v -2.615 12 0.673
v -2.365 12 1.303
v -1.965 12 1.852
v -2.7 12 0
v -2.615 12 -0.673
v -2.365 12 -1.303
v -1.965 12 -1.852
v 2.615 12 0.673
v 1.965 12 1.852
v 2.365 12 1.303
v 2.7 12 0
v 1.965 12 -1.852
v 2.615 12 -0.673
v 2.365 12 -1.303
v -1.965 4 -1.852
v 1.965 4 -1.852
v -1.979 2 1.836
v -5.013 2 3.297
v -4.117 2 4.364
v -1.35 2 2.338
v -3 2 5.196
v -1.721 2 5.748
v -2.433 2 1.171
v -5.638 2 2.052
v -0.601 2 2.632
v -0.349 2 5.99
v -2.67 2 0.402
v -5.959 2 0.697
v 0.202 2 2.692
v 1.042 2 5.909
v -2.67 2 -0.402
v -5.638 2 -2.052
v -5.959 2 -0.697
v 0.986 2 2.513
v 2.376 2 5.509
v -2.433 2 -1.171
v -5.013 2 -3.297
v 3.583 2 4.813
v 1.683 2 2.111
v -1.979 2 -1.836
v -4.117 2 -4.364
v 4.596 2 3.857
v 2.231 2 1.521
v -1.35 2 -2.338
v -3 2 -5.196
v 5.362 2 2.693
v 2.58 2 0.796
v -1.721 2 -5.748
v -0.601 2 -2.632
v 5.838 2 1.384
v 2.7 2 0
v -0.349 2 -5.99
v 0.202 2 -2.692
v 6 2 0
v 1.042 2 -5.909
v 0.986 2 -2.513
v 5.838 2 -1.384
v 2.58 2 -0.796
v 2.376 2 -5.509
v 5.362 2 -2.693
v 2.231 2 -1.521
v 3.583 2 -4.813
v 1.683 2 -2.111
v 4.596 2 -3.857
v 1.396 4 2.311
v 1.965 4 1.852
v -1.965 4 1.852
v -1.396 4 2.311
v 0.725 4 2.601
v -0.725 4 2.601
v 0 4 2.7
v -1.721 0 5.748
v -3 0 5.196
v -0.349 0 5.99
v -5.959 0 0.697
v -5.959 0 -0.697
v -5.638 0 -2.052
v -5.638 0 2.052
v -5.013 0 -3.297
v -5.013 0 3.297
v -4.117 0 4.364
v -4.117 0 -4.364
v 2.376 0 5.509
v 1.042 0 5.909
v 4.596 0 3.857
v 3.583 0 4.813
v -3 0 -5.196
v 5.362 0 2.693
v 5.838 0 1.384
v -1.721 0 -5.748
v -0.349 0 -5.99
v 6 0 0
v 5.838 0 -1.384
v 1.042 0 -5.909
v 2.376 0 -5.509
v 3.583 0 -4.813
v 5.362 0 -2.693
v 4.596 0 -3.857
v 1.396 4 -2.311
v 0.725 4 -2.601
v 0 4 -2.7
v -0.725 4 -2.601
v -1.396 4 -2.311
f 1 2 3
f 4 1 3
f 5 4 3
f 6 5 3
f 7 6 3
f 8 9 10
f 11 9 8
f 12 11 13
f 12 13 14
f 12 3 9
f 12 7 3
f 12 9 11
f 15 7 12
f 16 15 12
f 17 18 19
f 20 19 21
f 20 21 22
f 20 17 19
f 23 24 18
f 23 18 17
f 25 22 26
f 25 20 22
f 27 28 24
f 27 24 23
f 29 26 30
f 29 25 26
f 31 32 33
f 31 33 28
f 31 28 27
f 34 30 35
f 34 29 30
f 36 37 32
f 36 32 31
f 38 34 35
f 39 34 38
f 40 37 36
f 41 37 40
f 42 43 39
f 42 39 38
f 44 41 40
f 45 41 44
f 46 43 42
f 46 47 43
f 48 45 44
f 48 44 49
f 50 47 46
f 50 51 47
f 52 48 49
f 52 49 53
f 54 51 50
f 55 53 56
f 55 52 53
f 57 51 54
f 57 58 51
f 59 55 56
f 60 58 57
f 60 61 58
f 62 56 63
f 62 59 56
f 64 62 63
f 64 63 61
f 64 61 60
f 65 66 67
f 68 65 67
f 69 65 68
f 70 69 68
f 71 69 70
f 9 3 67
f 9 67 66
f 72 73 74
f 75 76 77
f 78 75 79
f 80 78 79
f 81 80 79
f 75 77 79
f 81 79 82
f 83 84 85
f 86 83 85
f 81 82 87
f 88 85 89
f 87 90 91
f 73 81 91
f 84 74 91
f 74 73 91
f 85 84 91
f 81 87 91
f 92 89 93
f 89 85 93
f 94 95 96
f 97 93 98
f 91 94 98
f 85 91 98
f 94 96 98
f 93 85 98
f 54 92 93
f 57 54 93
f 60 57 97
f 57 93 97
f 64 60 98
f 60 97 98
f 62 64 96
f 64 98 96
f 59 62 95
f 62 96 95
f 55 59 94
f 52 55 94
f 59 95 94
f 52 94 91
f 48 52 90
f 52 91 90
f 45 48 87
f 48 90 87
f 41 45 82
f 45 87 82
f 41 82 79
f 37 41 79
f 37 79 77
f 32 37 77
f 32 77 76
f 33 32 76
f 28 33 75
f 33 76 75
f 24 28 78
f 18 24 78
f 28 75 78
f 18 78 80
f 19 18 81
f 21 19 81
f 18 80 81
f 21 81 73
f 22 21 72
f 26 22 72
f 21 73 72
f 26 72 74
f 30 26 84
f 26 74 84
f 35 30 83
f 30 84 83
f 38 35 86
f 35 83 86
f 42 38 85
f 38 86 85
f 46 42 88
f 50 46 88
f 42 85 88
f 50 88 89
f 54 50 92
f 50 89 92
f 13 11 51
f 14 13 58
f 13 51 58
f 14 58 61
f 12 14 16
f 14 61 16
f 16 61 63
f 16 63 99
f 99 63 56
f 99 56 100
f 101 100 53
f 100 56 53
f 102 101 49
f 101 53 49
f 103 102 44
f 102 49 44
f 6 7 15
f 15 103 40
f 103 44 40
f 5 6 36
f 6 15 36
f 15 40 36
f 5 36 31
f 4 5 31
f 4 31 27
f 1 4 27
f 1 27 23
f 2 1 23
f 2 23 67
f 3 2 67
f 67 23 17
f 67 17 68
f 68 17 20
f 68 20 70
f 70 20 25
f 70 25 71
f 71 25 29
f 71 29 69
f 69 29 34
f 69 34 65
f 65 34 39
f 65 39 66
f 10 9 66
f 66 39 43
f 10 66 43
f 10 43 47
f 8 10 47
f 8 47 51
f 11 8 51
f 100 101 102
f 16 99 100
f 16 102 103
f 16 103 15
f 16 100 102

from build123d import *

# Parameters (mm, degrees)
SKETCH1_R           = 6
BOSS_EXTRUDE1_DEPTH = 2
SKETCH2_R           = 2.7
BOSS_EXTRUDE2_DEPTH = 10
CUT_EXTRUDE1_DEPTH  = 8


with BuildPart() as part:
    # Sketch1 → Boss-Extrude1 (new body)
    with BuildSketch(Plane(origin=(0, 0, 0), x_dir=(1, 0, 0), z_dir=(0, 1, 0))):
        Circle(SKETCH1_R)
    extrude(amount=BOSS_EXTRUDE1_DEPTH)

    # Sketch2 → Boss-Extrude2 (add)
    with BuildSketch(Plane(origin=(0, 2, 0), x_dir=(1, 0, 0), z_dir=(0, 1, 0))):
        Circle(SKETCH2_R)
    extrude(amount=BOSS_EXTRUDE2_DEPTH)

    # Sketch3 → Cut-Extrude1 (cut)
    with BuildSketch(Plane(origin=(0, 12, 0), x_dir=(1, 0, 0), z_dir=(0, 1, 0))):
        with BuildLine():
            Line((-1.965, 1.851695169), (1.965, 1.851695169))
            ThreePointArc((1.965, 1.851695169), (0, 2.7), (-1.965, 1.851695169))
        make_face()
        with BuildLine():
            Line((-1.965, -1.851695169), (1.965, -1.851695169))
            ThreePointArc((1.965, -1.851695169), (0, -2.7), (-1.965, -1.851695169))
        make_face()
    extrude(amount=-CUT_EXTRUDE1_DEPTH, mode=Mode.SUBTRACT)


solid = part.part
